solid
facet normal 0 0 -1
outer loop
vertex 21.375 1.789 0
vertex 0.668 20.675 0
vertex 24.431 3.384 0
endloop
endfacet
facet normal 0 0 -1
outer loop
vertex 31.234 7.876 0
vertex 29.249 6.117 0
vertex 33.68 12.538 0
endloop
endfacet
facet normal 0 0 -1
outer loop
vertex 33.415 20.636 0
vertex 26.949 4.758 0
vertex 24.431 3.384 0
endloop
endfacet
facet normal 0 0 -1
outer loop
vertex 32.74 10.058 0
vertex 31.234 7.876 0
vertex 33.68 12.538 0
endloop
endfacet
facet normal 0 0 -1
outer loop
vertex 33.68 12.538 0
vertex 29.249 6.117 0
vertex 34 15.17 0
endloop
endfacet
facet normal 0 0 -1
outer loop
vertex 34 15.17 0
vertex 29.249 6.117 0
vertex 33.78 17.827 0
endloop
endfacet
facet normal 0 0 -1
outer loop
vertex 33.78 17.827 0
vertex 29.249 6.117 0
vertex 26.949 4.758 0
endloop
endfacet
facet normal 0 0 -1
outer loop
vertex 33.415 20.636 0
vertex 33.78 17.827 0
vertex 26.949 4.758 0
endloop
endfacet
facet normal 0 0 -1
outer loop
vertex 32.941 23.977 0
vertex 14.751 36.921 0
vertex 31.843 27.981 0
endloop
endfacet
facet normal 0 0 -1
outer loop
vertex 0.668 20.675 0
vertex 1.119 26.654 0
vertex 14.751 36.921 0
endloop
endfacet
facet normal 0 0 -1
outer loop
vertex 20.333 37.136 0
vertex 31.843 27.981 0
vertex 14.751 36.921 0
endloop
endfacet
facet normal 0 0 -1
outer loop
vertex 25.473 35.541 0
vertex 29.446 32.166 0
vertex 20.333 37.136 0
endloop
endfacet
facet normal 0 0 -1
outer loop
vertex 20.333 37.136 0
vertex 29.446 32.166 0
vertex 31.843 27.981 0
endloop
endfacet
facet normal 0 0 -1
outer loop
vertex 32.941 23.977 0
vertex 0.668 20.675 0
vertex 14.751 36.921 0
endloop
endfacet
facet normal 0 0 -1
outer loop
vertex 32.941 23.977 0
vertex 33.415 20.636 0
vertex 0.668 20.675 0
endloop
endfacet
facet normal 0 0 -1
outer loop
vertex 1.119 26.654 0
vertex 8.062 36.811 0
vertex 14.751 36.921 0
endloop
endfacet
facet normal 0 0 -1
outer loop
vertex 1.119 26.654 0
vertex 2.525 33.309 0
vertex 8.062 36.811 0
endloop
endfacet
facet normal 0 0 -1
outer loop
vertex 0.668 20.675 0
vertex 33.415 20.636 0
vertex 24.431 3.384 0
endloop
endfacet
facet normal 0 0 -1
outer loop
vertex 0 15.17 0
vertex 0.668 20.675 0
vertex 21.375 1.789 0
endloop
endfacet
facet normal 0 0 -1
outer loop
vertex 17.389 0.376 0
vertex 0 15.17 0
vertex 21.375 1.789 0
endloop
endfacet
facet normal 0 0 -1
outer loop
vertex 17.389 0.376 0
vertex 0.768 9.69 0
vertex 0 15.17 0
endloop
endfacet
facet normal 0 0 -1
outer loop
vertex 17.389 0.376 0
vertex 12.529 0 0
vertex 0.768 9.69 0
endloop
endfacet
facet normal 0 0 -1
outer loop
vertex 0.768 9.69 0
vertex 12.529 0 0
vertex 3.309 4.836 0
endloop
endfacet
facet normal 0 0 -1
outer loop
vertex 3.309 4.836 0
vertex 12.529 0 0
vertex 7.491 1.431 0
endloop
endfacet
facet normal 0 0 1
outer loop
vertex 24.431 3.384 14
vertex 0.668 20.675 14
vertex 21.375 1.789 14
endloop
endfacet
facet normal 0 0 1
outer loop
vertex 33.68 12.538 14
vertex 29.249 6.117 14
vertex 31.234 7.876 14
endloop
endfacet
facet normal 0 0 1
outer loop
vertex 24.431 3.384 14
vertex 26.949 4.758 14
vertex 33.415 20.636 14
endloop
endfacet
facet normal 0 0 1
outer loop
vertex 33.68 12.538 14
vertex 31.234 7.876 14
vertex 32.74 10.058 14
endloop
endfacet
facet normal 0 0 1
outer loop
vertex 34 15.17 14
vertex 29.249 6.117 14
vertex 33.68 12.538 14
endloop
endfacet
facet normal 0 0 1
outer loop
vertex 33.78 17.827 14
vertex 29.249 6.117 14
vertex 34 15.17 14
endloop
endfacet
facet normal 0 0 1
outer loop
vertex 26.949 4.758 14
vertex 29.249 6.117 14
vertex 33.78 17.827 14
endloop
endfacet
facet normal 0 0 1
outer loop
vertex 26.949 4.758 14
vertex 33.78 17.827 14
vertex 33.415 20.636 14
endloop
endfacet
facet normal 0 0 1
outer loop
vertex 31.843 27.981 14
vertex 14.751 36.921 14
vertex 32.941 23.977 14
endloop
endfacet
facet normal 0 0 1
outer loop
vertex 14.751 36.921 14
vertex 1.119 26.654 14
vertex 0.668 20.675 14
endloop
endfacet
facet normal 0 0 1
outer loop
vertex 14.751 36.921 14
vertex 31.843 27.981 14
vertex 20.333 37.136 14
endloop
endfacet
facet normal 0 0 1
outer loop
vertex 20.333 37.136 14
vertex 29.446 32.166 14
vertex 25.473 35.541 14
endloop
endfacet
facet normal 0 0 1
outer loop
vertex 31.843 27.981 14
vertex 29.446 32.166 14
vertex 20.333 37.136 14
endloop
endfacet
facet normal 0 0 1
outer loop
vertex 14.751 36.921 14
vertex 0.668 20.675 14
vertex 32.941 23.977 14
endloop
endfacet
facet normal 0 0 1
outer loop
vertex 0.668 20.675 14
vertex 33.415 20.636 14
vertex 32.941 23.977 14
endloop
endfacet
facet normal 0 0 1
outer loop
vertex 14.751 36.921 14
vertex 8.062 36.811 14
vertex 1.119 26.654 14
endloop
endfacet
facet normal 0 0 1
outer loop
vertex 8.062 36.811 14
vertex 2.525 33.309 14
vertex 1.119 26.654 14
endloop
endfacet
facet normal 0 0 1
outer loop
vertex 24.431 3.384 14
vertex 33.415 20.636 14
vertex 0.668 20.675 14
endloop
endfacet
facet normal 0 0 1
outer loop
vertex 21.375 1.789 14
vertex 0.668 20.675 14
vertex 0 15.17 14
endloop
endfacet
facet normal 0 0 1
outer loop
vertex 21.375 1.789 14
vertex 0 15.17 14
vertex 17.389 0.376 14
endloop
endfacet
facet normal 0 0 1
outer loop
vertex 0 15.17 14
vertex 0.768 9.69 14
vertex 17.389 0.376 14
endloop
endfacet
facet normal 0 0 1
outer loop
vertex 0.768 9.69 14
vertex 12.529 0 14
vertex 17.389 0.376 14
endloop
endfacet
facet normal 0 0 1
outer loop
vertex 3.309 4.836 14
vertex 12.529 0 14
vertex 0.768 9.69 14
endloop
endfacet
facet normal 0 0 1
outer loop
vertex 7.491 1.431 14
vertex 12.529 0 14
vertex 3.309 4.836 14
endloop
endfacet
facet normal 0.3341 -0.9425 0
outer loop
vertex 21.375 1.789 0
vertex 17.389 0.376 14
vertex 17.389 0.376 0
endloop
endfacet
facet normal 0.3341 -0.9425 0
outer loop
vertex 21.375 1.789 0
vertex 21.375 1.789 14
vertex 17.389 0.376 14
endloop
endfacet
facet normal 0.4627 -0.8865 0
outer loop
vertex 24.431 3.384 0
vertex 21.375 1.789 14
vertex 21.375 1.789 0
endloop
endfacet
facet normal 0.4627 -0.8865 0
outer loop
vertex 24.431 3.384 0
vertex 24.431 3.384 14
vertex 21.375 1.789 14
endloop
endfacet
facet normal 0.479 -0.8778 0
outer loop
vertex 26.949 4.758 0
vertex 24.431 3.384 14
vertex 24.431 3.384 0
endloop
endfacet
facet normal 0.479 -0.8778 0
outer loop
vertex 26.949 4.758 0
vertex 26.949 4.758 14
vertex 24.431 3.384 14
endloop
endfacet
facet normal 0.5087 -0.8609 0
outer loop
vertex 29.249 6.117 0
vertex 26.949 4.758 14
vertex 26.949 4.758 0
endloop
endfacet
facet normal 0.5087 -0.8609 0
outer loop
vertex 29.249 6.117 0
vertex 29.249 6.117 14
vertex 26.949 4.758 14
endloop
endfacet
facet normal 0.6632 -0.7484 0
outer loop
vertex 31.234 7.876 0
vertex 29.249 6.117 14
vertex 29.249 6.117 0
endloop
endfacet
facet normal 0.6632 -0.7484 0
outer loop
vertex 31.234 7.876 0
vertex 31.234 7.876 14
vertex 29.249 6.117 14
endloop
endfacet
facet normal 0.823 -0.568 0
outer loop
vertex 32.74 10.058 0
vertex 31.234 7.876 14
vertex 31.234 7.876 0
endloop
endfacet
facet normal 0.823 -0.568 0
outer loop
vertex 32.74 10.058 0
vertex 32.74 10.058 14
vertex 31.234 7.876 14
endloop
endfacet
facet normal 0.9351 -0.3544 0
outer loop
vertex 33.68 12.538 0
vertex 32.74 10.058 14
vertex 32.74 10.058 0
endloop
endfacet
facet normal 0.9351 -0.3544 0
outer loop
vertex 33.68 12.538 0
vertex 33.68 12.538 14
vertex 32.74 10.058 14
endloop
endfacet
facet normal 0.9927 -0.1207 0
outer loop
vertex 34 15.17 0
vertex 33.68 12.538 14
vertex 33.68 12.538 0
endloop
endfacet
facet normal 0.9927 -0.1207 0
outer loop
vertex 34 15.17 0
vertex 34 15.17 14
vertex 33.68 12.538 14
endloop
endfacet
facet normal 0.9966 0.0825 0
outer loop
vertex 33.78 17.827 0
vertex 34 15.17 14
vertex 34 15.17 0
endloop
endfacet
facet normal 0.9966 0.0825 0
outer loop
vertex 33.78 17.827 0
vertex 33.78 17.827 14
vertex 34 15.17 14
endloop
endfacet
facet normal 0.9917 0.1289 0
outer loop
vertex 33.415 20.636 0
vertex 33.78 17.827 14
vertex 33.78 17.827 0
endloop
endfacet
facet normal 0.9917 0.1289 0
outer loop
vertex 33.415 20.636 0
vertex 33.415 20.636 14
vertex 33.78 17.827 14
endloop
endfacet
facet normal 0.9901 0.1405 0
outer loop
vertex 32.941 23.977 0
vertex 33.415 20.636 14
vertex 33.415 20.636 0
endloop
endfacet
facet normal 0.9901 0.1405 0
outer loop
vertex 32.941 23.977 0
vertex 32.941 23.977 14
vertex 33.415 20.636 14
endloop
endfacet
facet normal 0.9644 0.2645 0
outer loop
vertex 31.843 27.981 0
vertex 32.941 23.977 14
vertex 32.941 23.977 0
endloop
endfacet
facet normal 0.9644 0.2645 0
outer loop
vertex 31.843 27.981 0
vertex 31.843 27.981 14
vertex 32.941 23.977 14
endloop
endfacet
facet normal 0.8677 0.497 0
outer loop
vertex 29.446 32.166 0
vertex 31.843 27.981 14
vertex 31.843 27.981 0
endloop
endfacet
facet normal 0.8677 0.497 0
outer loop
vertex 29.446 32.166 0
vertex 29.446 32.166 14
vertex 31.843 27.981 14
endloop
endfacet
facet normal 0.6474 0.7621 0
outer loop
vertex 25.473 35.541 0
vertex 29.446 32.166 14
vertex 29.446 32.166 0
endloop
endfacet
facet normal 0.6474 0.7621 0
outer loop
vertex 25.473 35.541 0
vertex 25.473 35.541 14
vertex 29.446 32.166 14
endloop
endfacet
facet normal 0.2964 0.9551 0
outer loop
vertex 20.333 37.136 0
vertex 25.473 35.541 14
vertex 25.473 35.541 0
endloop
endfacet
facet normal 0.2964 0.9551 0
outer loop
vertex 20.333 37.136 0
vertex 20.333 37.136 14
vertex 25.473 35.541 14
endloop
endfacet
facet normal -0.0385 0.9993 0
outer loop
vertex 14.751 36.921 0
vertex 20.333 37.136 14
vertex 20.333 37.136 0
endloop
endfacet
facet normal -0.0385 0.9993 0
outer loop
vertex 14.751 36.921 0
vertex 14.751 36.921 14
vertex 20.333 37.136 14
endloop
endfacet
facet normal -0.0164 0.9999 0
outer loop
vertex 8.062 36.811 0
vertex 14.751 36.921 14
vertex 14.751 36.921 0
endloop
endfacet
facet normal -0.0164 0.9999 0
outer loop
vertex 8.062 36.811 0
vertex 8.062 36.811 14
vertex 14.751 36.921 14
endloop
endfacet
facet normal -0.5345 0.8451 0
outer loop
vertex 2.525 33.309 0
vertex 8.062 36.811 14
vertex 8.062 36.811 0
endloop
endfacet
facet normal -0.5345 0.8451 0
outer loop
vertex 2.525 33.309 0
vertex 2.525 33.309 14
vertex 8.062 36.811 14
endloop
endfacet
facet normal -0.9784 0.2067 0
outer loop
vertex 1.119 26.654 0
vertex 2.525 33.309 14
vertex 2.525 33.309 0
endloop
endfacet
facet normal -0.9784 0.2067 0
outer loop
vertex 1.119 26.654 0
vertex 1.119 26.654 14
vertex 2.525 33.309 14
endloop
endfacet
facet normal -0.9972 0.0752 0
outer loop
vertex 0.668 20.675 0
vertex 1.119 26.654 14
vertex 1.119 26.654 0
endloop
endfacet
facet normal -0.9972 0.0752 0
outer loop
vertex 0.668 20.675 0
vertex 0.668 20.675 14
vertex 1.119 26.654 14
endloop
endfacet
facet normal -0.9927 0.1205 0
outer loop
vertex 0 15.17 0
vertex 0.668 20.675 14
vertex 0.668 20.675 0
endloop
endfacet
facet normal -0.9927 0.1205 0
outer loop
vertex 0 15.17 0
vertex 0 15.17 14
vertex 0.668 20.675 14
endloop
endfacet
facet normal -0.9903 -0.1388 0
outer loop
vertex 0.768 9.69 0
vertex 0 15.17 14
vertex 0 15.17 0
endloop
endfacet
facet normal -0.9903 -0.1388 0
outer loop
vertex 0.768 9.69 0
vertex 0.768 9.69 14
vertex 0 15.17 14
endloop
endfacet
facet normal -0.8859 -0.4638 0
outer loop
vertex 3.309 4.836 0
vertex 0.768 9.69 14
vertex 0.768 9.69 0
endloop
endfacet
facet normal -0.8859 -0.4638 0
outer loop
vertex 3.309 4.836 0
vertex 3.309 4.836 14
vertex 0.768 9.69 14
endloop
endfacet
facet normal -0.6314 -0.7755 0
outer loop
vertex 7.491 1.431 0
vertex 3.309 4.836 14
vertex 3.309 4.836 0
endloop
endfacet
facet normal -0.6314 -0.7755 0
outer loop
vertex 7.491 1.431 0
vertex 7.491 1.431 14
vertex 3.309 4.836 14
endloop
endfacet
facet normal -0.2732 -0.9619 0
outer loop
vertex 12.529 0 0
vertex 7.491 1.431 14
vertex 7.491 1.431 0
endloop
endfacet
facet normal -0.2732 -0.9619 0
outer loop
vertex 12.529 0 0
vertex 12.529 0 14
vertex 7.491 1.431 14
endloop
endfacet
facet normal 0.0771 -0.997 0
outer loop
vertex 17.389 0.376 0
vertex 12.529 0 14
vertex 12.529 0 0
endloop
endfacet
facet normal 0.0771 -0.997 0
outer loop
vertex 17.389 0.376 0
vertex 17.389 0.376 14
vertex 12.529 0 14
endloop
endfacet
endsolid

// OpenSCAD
$fn = 32;

// ----------------------------------------------------------------------
// Cam disc: base radius 11.0 mm, lift 12.0 mm, 26 profile points
// ----------------------------------------------------------------------

// --- parameters (mm) ---
profile_height = 14;      // extrusion height
profile_points = 26;      // points of the closed outline

profile = [[34, 15.17], [33.78, 17.827], [33.415, 20.636], [32.941, 23.977], [31.843, 27.981], [29.446, 32.166], [25.473, 35.541], [20.333, 37.136], [14.751, 36.921], [8.062, 36.811], [2.525, 33.309], [1.119, 26.654], [0.668, 20.675], [0, 15.17], [0.768, 9.69], [3.309, 4.836], [7.491, 1.431], [12.529, 0], [17.389, 0.376], [21.375, 1.789], [24.431, 3.384], [26.949, 4.758], [29.249, 6.117], [31.234, 7.876], [32.74, 10.058], [33.68, 12.538]];  // single closed polygon, 26 points, counter clockwise

// --- the one profile operation ---
linear_extrude(height = profile_height) polygon(points = profile);
